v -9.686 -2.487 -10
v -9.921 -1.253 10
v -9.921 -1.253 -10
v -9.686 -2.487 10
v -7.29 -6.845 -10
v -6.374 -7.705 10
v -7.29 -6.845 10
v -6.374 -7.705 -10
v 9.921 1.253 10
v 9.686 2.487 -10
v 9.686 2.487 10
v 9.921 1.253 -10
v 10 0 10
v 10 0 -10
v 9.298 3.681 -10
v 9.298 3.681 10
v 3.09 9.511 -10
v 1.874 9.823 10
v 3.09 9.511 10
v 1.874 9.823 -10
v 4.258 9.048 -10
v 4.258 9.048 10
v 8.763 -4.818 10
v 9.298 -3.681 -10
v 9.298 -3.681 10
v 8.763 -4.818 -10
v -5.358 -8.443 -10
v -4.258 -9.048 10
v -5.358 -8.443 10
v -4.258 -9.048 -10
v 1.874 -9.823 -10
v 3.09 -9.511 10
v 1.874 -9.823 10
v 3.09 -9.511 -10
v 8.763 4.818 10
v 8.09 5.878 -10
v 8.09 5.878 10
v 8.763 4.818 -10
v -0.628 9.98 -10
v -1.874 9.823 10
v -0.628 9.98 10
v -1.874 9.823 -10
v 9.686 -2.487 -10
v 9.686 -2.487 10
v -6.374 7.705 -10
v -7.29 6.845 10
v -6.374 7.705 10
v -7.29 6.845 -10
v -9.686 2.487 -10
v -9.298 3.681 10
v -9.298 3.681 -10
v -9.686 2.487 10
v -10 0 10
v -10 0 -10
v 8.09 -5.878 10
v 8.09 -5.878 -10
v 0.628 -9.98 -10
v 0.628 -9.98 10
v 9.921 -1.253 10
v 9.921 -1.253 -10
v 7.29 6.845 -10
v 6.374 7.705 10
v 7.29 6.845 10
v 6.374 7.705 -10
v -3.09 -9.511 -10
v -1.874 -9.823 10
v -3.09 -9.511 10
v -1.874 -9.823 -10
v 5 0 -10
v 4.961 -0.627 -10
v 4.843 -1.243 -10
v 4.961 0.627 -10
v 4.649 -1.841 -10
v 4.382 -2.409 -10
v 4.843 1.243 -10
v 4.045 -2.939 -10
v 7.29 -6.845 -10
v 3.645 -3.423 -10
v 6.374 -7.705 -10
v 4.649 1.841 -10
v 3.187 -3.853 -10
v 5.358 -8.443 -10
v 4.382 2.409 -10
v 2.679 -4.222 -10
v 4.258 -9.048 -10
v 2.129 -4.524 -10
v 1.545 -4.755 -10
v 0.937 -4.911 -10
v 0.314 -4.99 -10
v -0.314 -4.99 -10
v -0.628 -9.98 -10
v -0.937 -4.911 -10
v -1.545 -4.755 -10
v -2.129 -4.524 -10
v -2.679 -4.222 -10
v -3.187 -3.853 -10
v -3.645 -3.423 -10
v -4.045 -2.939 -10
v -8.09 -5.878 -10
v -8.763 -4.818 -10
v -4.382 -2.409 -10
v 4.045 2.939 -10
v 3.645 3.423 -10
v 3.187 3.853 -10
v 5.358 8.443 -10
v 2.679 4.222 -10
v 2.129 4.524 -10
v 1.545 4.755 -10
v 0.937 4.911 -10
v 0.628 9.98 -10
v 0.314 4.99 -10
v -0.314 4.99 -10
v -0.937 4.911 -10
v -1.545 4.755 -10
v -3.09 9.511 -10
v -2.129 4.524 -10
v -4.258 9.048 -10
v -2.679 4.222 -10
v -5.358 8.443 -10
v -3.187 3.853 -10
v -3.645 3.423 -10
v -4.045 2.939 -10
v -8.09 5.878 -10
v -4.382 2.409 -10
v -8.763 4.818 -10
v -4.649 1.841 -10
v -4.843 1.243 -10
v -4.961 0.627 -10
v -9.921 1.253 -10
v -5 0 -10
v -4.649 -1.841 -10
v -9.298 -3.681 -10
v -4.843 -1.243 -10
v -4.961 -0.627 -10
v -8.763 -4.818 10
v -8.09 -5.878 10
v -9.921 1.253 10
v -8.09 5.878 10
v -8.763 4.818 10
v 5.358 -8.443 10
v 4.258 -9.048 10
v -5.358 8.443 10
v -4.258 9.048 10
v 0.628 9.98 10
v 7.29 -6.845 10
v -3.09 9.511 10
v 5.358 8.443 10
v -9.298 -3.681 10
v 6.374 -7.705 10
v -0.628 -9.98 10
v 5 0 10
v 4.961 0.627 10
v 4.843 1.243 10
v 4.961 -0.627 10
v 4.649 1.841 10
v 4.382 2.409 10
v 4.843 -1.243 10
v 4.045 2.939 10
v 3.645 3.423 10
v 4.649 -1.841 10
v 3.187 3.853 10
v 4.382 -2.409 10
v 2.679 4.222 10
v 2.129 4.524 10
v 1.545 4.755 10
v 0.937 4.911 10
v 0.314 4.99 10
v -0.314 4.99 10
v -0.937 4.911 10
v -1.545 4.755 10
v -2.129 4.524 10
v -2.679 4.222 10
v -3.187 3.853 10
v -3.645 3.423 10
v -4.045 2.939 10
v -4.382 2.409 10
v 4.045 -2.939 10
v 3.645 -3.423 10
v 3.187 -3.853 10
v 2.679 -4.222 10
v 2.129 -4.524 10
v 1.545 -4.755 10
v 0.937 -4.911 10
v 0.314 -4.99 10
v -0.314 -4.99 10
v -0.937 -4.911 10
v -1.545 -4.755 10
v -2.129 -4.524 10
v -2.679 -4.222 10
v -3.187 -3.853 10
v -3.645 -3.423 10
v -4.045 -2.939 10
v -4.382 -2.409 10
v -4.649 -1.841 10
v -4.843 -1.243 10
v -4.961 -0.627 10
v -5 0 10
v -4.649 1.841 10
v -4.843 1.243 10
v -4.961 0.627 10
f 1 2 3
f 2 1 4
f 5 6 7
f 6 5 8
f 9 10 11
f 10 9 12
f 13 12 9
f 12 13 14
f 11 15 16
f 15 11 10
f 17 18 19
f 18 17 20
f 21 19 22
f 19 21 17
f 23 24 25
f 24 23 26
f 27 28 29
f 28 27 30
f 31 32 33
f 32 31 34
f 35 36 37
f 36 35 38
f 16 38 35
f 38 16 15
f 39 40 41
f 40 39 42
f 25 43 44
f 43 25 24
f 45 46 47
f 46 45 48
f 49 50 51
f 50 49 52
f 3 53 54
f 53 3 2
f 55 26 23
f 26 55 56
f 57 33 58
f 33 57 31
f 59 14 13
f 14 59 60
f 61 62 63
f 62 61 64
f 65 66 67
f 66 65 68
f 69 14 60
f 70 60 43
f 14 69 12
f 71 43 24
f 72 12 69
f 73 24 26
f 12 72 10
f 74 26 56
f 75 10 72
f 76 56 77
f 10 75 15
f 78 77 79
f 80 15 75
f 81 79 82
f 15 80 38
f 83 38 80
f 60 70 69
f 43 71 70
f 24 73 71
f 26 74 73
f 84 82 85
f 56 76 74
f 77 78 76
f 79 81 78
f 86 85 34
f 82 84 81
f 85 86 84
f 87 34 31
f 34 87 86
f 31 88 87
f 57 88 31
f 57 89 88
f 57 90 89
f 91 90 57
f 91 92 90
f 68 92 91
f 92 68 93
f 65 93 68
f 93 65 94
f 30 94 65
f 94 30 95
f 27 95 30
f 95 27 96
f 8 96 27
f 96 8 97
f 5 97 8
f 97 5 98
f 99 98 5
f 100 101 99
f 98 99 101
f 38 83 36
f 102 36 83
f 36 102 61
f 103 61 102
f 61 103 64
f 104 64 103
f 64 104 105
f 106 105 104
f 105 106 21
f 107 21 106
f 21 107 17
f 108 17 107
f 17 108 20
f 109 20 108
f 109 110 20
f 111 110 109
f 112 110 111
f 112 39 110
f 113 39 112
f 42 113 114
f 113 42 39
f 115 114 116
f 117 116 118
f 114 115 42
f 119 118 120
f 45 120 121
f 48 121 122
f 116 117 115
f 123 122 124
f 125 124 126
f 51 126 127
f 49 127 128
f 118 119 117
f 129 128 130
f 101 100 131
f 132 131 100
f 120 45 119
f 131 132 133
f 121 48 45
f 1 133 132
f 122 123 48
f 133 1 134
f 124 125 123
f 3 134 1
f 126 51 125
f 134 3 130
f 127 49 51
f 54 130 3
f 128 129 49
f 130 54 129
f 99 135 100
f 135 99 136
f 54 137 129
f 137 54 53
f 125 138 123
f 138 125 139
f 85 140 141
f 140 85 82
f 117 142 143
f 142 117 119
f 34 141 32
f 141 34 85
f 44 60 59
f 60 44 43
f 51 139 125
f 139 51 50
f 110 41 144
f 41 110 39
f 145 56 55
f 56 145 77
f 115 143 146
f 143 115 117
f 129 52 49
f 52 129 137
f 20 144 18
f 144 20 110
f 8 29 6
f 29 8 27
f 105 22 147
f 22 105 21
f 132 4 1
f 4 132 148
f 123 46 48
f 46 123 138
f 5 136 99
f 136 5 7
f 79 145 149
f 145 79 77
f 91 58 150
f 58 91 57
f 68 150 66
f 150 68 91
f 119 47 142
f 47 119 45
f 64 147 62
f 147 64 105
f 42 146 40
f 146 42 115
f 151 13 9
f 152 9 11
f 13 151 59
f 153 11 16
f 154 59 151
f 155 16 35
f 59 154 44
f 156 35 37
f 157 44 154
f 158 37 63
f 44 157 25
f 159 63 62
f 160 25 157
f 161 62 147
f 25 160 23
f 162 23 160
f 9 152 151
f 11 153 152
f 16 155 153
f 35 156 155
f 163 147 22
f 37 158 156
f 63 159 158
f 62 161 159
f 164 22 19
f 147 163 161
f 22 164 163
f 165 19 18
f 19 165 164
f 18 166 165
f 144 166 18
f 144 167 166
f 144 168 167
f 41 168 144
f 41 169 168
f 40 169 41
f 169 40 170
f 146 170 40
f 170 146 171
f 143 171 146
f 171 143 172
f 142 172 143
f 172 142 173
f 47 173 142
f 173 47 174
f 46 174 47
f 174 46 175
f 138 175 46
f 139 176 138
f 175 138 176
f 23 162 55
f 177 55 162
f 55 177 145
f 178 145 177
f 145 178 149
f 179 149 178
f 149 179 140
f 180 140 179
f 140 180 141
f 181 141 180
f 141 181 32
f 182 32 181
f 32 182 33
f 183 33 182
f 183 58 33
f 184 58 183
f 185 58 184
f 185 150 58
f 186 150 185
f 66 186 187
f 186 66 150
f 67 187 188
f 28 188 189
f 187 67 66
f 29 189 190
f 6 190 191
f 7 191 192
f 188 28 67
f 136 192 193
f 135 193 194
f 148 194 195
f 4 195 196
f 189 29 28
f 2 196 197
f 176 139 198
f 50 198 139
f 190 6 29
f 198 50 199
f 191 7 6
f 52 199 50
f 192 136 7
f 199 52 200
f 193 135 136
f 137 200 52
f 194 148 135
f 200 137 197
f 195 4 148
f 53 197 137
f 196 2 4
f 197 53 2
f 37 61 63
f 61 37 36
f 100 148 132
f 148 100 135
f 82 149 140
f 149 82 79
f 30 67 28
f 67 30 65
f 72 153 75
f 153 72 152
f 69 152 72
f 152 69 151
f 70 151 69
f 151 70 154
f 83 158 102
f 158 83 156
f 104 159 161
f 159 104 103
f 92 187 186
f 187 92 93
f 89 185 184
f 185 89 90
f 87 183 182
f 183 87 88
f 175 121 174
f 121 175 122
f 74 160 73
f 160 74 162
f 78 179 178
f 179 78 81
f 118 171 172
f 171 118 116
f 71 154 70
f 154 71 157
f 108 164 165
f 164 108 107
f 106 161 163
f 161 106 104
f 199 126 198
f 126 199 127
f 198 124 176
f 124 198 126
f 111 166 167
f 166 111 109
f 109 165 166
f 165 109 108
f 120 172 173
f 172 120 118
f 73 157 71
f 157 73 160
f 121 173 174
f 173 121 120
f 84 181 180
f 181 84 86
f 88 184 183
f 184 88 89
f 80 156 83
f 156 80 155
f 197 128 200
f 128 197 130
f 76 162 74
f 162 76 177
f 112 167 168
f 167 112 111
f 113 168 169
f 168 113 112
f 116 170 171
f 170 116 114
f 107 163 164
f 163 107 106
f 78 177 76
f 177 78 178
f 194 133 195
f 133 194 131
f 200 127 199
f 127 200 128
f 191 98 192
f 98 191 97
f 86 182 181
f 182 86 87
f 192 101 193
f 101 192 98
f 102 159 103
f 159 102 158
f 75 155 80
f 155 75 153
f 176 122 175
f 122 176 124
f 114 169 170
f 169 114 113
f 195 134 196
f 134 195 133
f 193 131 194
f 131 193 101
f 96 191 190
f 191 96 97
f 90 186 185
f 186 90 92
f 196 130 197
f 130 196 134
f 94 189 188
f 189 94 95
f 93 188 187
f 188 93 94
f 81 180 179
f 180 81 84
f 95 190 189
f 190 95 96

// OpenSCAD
$fn = 50;


difference() {
	union() {
		translate(v = [0, 0, -10.0000000000]) {
			cylinder(h = 20, r = 10.0000000000);
		}
	}
	union() {
		translate(v = [0, 0, -100.0000000000]) {
			cylinder(h = 200, r = 5.0000000000);
		}
	}
}
